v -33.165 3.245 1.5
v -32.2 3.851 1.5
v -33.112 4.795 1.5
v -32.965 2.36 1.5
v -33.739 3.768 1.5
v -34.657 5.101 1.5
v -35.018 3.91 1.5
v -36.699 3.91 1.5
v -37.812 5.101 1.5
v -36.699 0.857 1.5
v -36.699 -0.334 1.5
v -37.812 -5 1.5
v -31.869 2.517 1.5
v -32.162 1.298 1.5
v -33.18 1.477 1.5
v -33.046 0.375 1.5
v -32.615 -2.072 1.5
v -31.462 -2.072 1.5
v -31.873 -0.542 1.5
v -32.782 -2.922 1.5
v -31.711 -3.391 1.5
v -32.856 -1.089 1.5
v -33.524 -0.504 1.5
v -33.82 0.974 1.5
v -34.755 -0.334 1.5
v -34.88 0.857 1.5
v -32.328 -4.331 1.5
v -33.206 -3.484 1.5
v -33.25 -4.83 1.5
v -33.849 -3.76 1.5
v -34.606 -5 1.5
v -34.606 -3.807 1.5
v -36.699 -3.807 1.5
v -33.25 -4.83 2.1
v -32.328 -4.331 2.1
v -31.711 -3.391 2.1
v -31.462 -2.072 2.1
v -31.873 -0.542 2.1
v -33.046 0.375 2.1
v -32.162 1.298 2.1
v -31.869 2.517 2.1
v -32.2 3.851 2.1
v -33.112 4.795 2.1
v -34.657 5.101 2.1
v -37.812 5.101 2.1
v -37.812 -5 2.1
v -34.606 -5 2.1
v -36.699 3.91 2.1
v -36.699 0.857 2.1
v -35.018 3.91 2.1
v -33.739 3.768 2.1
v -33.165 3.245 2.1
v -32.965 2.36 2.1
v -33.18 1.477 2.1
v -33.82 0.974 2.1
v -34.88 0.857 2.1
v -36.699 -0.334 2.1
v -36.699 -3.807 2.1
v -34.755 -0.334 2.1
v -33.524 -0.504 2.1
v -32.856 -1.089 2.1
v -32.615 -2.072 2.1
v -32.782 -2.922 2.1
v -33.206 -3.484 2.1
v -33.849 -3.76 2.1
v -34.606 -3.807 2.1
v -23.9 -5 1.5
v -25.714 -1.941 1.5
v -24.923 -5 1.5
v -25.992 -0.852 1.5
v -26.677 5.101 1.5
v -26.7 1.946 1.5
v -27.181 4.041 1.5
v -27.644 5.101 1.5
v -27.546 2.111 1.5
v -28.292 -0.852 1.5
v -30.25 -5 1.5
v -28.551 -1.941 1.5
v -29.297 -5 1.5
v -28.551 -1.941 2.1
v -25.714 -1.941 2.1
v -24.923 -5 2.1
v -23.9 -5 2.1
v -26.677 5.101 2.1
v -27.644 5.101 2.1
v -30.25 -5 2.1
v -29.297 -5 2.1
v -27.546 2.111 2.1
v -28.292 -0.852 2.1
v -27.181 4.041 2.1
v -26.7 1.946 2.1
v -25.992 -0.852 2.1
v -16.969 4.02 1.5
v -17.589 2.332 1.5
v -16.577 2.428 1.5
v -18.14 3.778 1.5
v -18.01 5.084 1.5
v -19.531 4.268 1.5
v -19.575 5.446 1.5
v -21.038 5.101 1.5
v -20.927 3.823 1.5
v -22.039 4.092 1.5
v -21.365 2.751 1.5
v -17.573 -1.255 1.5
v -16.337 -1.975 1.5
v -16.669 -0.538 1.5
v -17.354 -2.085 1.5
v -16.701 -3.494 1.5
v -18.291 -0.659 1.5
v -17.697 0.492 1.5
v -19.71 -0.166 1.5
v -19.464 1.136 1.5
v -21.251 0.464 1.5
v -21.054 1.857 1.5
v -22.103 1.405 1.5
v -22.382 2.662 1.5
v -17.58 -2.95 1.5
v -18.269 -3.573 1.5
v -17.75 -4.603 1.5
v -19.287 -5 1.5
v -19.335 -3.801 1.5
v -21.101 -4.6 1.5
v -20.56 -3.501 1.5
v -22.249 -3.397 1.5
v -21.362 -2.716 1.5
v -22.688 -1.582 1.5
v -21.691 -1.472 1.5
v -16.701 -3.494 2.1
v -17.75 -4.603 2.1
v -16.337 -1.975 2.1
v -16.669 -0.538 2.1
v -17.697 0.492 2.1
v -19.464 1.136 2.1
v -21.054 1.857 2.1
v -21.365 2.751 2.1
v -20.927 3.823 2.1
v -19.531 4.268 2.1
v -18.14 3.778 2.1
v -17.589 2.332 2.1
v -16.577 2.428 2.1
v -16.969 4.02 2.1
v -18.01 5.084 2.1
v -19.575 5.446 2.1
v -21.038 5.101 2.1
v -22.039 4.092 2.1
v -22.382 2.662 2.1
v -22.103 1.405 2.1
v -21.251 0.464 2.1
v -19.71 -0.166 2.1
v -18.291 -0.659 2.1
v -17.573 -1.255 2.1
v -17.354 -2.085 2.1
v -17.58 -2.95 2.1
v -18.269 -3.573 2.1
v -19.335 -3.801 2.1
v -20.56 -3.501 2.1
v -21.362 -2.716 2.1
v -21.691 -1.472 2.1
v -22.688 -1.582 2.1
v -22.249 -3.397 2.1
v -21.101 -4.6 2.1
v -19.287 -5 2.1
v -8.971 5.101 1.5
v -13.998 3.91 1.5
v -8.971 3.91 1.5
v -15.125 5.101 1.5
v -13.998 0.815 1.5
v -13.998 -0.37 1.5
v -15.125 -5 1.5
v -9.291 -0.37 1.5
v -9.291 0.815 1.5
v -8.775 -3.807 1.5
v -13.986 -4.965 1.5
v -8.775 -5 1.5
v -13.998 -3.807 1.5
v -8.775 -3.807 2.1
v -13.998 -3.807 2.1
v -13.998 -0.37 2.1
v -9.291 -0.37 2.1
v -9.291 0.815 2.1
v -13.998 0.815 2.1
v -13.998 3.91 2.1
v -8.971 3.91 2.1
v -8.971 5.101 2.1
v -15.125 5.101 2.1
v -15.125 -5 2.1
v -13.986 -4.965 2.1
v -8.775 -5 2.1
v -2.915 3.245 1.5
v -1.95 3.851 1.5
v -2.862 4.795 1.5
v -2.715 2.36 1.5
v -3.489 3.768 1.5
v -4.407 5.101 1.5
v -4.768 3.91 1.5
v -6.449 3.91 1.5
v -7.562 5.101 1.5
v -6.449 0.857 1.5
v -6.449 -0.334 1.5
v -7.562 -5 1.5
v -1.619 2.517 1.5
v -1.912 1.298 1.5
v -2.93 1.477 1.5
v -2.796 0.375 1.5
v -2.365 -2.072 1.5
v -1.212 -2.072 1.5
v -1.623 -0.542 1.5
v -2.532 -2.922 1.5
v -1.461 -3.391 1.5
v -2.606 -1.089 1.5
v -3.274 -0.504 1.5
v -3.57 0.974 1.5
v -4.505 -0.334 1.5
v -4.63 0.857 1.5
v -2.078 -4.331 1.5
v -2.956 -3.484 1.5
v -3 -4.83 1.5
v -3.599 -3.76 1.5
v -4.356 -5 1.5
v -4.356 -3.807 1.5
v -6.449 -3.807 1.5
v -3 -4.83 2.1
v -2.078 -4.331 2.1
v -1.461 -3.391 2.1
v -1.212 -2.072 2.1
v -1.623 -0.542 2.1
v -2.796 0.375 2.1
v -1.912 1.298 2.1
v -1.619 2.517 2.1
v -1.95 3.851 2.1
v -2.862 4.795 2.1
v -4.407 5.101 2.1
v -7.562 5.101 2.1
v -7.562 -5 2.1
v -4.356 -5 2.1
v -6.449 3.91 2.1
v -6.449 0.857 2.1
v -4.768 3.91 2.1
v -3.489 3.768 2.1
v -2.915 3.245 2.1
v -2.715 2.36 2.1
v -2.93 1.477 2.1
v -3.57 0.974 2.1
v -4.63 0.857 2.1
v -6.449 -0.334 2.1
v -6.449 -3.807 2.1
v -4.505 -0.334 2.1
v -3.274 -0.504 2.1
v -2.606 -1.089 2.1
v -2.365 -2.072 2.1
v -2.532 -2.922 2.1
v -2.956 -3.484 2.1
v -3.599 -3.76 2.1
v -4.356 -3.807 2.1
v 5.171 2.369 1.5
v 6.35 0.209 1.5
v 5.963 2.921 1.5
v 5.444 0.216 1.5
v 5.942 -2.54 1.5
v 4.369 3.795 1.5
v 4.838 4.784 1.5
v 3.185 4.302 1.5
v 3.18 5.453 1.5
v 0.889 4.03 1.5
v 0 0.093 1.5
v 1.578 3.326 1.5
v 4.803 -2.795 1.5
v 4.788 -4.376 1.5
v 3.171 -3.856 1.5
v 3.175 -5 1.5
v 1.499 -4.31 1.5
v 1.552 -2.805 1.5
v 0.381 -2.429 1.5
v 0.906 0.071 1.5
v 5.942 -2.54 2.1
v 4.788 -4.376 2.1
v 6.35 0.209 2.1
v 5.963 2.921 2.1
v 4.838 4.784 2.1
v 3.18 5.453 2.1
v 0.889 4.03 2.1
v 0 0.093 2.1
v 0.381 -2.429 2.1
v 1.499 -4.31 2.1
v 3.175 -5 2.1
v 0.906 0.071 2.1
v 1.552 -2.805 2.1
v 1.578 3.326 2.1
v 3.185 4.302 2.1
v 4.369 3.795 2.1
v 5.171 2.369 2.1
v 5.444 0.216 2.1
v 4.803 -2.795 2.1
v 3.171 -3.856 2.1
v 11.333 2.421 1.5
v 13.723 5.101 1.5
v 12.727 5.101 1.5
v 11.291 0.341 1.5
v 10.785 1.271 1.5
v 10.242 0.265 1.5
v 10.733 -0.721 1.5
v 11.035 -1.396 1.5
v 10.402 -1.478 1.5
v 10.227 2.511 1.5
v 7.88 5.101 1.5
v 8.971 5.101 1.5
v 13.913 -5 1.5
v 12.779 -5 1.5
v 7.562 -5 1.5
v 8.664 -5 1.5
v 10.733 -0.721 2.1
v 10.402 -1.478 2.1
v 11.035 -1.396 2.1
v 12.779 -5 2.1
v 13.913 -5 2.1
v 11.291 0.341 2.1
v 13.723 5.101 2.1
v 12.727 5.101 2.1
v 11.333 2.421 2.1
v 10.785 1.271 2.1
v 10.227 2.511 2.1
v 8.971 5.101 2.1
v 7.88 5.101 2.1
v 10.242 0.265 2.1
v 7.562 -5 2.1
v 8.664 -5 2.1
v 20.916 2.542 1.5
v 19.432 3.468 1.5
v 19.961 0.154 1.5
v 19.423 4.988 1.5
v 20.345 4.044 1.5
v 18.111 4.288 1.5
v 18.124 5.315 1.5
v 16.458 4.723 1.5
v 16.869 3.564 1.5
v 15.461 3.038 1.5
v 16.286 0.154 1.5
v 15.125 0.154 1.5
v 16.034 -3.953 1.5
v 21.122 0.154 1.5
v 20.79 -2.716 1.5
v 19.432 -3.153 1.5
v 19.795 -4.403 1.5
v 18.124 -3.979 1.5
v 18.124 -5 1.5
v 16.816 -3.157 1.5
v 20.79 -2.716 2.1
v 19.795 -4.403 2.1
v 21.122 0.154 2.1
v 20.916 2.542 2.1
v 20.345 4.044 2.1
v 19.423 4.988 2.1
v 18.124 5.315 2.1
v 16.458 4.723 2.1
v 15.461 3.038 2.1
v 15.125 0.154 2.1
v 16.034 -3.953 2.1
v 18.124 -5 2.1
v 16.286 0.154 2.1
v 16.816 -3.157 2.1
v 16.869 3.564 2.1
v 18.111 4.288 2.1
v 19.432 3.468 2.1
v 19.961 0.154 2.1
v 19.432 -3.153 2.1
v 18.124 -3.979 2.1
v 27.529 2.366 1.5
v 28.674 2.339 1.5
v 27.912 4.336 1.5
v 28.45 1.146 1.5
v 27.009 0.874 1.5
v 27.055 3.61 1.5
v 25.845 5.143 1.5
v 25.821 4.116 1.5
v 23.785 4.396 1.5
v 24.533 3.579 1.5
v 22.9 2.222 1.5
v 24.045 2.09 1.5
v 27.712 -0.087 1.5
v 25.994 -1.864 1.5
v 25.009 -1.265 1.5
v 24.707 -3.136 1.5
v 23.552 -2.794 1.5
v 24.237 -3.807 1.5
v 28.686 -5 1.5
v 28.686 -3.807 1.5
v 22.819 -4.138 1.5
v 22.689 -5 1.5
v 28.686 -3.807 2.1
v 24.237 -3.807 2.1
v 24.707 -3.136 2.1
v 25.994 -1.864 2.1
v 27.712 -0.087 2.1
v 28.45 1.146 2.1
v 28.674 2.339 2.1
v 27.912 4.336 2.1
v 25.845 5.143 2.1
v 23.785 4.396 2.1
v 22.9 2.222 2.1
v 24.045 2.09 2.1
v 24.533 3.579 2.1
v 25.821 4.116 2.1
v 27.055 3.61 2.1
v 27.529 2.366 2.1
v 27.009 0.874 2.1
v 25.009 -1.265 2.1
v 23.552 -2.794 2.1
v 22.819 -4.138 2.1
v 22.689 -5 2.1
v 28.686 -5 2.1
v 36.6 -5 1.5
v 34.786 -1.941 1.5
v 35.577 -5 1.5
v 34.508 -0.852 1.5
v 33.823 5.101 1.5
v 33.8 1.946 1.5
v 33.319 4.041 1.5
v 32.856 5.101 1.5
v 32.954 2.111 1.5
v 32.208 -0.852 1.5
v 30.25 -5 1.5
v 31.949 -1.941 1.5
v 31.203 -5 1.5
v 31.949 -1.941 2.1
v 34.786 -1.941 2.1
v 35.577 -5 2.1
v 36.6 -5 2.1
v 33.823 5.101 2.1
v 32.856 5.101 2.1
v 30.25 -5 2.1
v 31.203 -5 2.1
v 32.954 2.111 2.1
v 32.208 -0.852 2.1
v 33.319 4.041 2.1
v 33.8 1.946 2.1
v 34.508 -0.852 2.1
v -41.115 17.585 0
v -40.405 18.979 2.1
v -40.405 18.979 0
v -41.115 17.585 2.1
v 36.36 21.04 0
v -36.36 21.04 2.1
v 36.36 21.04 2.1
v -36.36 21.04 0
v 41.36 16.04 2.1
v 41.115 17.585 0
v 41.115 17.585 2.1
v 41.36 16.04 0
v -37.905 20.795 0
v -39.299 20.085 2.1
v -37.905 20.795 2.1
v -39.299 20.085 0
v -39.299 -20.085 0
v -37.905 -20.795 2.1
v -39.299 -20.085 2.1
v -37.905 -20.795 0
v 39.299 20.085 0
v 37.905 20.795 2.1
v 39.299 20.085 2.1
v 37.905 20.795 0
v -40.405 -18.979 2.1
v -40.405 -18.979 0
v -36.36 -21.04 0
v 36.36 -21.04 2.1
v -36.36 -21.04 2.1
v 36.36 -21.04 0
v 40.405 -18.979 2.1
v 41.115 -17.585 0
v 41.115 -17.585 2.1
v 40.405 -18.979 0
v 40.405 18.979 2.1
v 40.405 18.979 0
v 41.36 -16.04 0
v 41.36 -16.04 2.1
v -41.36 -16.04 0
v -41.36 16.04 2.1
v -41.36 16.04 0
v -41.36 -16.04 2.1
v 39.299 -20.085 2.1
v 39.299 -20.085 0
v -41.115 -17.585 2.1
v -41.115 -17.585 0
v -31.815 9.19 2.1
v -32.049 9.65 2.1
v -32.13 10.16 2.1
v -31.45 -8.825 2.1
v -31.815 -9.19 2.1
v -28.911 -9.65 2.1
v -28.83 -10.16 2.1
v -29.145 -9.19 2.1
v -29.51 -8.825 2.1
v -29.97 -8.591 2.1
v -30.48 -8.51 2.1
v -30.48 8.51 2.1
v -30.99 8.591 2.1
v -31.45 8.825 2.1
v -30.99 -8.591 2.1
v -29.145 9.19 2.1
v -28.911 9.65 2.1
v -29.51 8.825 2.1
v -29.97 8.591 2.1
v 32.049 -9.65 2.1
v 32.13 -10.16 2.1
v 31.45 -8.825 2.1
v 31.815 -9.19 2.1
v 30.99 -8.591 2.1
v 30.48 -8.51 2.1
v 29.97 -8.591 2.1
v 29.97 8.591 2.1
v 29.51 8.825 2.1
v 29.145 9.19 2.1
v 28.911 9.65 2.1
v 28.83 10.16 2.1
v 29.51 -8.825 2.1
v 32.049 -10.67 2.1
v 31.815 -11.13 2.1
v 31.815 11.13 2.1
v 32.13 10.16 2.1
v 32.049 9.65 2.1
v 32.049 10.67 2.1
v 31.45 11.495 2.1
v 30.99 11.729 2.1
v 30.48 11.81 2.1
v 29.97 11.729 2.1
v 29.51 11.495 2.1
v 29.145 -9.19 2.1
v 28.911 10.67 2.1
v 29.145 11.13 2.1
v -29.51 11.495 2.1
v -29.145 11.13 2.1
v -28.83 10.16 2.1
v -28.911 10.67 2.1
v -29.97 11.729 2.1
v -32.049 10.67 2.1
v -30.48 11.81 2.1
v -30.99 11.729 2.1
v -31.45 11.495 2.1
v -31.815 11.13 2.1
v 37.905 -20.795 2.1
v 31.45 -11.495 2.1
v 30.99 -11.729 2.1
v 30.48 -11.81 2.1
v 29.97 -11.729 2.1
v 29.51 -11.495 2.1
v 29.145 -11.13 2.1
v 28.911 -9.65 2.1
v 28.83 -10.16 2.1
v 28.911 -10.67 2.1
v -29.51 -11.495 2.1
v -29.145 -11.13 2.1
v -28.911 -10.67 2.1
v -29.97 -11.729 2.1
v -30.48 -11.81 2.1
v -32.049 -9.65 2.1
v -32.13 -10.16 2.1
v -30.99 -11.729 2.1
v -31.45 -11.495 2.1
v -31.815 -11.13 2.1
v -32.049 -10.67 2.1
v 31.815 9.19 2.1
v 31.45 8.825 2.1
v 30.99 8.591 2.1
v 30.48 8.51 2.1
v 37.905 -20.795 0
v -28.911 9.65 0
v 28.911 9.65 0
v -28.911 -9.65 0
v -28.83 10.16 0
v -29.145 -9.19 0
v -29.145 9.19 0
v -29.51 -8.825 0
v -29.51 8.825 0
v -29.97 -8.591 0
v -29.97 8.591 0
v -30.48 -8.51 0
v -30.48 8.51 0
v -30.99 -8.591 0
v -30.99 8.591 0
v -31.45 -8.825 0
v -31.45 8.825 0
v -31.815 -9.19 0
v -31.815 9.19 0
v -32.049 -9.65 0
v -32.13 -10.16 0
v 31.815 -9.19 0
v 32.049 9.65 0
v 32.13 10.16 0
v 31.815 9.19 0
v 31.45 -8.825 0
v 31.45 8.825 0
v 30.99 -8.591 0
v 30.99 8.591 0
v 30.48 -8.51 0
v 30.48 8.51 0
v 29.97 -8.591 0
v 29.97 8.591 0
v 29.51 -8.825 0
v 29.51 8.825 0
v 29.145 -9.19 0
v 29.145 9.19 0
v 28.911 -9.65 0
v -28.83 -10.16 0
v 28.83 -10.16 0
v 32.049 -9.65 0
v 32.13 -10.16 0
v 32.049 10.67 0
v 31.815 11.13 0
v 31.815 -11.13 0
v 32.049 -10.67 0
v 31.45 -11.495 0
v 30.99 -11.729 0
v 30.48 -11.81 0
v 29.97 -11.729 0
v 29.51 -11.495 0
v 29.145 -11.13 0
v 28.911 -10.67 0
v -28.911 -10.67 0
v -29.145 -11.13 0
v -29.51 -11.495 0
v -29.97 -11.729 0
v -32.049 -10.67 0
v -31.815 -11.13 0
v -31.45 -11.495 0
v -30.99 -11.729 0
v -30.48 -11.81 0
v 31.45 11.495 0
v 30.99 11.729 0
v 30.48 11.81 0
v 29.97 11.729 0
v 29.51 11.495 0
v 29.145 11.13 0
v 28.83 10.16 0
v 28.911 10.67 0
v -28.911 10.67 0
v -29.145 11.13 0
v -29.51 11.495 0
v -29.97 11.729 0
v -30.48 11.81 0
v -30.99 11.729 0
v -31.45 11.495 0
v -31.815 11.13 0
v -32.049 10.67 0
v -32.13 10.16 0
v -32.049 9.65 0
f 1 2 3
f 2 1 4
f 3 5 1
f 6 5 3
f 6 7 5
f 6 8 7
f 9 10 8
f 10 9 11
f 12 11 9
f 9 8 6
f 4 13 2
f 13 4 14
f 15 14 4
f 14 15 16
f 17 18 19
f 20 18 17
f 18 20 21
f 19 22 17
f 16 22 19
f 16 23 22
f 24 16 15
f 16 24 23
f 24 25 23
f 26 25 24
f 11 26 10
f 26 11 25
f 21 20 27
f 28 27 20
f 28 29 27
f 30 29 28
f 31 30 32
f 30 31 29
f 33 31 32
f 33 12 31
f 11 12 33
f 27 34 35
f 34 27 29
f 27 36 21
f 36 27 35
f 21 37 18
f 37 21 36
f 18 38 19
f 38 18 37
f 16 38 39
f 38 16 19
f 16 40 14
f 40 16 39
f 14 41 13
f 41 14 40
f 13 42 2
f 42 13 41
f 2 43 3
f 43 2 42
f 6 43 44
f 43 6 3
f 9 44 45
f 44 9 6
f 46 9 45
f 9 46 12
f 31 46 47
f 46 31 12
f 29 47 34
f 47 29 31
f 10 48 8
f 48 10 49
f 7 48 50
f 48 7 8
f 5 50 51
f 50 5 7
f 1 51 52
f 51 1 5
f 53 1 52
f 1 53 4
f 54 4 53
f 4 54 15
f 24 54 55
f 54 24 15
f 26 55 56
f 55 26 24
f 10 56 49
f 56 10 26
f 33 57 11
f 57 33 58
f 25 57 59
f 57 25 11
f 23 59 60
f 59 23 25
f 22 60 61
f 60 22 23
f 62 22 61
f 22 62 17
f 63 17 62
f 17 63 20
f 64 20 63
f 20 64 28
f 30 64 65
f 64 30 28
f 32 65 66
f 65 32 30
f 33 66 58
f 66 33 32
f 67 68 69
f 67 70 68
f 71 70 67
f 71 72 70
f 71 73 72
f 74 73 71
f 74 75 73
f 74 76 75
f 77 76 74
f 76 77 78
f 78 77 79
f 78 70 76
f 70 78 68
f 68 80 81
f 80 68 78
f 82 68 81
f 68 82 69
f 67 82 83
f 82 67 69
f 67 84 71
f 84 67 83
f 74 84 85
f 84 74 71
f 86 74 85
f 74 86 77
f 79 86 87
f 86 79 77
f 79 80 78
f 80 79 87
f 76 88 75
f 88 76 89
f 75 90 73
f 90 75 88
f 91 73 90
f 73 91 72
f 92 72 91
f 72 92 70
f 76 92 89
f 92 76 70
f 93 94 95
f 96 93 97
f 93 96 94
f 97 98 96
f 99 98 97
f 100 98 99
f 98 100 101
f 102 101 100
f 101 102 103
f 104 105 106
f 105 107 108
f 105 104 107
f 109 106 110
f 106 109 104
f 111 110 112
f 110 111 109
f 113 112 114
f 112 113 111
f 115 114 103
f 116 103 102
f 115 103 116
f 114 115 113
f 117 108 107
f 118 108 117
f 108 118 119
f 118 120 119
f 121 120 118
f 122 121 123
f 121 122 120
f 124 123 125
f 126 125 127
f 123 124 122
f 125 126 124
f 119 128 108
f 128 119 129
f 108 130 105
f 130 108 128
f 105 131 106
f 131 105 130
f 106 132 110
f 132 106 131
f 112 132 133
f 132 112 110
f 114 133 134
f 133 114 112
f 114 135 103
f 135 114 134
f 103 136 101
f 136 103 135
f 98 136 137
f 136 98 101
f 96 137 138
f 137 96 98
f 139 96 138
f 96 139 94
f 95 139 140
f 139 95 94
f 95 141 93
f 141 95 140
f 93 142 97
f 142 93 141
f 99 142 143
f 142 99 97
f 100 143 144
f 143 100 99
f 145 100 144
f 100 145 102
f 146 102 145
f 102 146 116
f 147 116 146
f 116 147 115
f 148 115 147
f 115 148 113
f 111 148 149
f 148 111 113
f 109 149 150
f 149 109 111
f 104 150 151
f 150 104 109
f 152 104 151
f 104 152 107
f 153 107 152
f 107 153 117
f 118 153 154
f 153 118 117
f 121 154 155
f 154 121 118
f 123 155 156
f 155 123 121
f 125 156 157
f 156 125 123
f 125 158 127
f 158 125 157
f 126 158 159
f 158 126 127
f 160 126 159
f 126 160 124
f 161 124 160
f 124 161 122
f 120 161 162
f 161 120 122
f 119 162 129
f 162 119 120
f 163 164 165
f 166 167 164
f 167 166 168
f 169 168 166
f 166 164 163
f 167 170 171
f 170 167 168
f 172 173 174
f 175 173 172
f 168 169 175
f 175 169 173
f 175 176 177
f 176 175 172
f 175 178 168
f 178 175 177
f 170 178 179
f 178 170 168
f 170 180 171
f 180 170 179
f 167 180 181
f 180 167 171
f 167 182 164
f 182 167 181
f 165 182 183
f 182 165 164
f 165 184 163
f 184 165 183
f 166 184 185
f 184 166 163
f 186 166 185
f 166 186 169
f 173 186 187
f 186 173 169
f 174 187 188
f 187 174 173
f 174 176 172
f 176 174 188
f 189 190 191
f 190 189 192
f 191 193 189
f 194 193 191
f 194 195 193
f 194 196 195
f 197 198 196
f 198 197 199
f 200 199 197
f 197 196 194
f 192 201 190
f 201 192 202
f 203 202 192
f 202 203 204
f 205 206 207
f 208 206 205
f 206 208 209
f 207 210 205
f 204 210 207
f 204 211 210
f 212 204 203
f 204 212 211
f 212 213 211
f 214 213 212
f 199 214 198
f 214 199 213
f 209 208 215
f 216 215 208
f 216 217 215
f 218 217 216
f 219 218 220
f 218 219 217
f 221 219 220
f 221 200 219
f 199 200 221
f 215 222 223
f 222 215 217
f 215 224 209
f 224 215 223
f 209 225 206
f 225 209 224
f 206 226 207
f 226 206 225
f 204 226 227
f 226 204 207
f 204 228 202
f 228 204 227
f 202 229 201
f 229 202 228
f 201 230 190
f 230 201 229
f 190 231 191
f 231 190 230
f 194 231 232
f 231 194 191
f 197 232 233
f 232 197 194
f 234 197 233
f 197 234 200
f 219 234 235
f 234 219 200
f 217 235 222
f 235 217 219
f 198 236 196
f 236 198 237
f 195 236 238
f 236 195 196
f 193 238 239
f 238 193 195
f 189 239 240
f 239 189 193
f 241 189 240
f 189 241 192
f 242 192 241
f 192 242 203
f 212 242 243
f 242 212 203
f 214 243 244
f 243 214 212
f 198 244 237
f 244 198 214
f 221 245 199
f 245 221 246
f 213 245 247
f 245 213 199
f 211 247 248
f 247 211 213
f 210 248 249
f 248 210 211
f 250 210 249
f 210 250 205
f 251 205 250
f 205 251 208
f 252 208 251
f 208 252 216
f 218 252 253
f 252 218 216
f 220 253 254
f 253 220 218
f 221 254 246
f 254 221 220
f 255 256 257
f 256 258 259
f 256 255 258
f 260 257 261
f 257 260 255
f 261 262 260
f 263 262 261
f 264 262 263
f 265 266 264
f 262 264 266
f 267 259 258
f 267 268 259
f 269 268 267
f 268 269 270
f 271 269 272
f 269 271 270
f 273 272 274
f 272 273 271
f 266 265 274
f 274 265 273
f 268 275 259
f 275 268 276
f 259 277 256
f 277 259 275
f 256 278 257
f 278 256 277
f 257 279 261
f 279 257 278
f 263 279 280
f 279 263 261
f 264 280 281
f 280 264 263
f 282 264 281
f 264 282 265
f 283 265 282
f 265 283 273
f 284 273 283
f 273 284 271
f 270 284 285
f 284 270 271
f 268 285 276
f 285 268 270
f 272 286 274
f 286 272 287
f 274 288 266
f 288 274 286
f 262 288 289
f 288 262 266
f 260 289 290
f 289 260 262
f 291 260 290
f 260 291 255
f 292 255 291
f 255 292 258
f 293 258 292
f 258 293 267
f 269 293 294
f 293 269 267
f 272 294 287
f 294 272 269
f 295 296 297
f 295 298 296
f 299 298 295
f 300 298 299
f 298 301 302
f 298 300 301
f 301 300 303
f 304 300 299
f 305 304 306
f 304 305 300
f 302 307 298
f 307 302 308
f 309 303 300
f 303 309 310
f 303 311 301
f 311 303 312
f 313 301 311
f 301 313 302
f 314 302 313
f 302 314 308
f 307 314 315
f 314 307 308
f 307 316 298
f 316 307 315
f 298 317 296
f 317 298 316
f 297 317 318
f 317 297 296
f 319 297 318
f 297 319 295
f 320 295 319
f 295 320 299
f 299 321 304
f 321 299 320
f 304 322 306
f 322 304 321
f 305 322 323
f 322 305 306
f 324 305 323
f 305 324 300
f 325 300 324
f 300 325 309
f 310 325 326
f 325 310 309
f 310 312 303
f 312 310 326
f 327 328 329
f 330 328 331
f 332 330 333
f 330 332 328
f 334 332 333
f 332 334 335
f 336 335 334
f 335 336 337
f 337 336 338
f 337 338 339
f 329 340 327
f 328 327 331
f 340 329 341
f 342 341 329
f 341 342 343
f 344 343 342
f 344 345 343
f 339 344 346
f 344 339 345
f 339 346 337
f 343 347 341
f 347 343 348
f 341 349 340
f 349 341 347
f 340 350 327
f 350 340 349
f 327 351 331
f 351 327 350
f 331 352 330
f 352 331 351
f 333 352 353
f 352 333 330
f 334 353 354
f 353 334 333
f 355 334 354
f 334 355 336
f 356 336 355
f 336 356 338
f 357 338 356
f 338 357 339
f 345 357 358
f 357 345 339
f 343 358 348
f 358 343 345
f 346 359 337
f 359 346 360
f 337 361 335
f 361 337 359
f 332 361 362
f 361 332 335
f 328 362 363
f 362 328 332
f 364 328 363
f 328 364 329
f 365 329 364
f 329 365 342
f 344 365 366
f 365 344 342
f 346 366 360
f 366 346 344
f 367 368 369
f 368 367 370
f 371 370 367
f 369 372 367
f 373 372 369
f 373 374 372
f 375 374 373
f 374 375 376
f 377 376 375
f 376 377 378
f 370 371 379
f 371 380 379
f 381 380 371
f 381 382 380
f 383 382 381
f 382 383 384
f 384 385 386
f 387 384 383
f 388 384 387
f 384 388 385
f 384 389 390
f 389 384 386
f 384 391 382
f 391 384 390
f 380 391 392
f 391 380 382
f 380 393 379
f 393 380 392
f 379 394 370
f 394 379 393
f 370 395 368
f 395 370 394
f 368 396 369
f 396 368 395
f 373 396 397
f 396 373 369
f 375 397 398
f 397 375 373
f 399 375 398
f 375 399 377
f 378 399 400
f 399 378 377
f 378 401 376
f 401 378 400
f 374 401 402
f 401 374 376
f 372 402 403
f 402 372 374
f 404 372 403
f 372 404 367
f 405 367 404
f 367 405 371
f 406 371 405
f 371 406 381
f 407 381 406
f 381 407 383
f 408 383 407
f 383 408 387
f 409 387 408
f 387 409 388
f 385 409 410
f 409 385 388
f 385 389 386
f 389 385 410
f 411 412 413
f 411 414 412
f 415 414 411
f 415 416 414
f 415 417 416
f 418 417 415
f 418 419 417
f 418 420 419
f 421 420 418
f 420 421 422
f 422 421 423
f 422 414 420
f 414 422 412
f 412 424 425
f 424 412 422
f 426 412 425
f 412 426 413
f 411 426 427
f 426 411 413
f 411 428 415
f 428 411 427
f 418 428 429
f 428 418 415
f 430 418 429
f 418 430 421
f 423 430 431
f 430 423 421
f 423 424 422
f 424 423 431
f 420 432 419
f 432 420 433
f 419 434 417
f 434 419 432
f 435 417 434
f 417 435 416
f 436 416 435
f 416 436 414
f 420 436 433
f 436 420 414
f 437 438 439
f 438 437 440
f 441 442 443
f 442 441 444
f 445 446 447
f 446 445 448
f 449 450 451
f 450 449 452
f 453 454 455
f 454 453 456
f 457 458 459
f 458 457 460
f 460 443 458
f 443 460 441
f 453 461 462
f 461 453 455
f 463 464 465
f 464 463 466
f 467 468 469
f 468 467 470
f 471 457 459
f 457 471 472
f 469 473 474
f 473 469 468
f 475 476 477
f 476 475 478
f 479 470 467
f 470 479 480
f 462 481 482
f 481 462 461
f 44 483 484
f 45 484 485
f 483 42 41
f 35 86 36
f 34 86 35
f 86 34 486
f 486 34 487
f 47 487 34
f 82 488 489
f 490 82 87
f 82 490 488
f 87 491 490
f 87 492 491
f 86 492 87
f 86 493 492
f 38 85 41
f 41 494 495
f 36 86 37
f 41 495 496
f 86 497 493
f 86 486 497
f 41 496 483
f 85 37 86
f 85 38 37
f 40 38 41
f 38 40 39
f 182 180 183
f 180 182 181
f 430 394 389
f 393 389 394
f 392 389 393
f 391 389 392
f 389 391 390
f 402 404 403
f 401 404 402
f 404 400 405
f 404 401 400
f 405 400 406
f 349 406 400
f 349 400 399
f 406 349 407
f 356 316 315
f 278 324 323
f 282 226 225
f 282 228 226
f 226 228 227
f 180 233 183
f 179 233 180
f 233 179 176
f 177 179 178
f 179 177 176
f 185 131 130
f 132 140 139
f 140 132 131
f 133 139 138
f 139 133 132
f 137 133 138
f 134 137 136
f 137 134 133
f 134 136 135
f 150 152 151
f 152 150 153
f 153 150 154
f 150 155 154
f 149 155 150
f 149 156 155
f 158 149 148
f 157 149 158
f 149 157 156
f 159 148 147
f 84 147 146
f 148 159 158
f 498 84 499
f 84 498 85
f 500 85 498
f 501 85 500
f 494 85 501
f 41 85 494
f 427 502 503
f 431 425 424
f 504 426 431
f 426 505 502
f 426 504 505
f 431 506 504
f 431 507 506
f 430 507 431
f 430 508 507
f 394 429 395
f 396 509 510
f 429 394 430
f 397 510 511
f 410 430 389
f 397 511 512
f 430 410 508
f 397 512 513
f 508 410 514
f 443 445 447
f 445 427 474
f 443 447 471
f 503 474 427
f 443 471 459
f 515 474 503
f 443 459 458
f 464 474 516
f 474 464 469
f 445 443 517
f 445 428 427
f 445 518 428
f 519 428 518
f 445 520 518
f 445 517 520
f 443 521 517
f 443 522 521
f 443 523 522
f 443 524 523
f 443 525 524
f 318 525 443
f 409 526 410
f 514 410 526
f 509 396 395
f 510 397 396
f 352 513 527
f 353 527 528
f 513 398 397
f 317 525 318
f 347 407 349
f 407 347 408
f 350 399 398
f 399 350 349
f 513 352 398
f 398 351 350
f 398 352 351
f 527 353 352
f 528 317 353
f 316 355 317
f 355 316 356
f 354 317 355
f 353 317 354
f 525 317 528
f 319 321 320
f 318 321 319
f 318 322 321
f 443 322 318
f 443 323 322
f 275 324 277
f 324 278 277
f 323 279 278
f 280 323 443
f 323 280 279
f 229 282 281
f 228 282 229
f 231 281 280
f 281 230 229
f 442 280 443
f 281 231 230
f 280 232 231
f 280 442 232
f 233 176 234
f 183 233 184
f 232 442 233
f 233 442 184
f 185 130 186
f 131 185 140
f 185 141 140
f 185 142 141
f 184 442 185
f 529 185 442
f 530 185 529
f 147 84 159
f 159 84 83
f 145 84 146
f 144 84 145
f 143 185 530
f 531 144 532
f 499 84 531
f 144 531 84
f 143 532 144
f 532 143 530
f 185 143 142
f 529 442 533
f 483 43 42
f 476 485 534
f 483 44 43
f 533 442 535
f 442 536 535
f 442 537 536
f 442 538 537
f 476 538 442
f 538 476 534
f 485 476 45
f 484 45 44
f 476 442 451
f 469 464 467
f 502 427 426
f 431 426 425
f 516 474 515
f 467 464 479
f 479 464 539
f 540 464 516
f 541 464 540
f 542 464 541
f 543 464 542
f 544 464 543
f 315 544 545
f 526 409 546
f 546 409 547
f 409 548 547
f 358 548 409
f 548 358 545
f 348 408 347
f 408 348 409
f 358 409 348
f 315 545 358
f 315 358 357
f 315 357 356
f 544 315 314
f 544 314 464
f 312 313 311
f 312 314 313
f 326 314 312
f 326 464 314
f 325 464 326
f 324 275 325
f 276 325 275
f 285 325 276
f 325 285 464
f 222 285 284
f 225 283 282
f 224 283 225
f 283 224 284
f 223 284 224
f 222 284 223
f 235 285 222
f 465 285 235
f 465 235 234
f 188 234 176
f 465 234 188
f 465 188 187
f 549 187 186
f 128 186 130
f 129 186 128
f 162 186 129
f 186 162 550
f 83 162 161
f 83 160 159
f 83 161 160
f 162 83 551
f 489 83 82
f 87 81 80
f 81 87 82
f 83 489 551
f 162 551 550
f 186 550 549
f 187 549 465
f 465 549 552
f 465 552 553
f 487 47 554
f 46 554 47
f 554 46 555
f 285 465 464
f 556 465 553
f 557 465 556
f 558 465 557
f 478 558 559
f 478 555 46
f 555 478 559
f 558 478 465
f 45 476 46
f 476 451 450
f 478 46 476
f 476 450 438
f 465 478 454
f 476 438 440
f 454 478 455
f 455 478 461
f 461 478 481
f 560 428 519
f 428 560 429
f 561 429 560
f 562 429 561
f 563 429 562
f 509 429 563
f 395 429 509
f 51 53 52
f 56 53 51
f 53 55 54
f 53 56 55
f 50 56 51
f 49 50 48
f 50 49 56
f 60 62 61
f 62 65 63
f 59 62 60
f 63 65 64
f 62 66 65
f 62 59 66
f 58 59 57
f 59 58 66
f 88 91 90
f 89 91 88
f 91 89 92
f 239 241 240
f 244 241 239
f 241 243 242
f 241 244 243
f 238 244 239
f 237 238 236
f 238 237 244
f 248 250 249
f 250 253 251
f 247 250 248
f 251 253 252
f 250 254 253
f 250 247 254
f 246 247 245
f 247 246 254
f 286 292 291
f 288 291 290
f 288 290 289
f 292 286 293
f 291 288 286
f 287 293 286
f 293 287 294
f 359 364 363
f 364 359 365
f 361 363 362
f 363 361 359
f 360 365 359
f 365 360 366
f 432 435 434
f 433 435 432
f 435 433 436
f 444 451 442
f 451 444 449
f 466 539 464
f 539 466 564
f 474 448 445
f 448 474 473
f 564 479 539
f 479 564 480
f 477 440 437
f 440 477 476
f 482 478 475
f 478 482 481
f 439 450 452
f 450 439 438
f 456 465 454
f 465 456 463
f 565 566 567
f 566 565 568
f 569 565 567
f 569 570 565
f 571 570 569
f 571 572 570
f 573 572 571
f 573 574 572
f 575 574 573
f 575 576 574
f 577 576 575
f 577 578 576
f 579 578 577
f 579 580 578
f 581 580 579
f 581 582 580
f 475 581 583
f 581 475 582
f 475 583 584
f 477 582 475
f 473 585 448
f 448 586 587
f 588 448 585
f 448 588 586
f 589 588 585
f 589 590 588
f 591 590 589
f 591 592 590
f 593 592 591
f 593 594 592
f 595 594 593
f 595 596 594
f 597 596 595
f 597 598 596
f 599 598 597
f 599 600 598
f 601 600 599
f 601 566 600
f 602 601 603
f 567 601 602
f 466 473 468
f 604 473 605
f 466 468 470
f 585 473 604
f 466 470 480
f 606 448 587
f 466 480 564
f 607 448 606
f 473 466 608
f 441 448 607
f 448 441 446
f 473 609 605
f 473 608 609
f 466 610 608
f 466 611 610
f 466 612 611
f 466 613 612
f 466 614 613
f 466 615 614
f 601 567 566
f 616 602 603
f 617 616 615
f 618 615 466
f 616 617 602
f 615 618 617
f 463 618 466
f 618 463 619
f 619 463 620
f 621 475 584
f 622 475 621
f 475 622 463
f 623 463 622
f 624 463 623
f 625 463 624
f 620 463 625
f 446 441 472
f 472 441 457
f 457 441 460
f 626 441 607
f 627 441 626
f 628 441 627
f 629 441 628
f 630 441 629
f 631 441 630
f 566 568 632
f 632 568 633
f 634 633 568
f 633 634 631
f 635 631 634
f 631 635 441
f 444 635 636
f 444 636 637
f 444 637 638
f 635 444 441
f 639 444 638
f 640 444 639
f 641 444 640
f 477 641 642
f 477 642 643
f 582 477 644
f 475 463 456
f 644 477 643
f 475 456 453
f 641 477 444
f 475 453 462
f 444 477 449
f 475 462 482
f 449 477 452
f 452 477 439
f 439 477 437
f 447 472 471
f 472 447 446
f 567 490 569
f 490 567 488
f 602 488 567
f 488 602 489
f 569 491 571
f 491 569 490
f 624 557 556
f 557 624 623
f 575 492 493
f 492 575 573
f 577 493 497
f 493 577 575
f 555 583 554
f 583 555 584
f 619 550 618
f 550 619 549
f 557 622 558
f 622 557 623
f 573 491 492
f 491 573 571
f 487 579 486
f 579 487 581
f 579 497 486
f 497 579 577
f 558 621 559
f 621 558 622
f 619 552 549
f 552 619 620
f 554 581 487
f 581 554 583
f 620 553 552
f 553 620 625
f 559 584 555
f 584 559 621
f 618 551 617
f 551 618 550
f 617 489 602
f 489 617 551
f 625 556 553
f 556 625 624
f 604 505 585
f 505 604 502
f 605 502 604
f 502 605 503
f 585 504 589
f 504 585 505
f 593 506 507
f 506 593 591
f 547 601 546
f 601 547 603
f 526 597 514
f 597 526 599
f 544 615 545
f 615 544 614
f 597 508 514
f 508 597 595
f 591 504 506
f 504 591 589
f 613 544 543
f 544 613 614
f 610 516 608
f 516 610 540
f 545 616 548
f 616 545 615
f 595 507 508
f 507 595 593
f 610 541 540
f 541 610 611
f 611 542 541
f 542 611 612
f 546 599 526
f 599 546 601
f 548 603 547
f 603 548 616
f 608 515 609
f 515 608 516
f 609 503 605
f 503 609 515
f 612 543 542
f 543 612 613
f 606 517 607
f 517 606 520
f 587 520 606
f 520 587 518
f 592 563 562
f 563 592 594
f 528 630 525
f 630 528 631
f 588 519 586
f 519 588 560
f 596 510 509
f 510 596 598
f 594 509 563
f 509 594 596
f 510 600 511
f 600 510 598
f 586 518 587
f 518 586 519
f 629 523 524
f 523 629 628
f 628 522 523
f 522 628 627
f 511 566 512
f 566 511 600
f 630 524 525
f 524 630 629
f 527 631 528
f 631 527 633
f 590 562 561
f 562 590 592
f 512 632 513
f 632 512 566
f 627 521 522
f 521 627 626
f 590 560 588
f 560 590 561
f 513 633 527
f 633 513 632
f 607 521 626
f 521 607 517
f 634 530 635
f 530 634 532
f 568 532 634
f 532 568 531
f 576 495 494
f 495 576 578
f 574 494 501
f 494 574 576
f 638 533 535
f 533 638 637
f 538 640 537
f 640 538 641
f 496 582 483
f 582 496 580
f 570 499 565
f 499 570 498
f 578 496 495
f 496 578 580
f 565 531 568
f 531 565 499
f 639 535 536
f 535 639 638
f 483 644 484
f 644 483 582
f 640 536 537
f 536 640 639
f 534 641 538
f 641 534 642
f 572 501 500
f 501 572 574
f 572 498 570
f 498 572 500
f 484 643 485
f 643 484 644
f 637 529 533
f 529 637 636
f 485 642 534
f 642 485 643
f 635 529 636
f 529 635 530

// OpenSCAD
// file: ../configuration.scad
//Název boxu (zařízení)
box_jmeno="BASEBOX02A";

//ALBASE1115
//------------------------------------------------------------
///*
vzdalenost_der = 10.16; //rozteč děr mezi sebou
radidus_hrany = 5; //radius zaobleni sloupku

//parametry lišty
vzdalenost_od_okraje = 8.88; //vzdalenost stredu upevnovaci diry od kraje desky

//mala hrana
pocet_der1 = 0; //pocet der desky, ponížené o 3

//velka hrana
pocet_der2 = 4; //pocet der desky, ponížené o 3
//*/


//OBECNE PARAMETRY KRABICKY
//------------------------------------------------------------
//BOCNICE
vyska_bocnice=30;
tloustka_bocnice=2;

//PLBASE PARAMETRY
//------------------------------------------------------------
tloustka_plbase = 2; //tloustka plbase
prekryti_der=0.3; //sila materiálu, který překrývá díry

//PRIPADNA VYSKA NOZICEK
//------------------------------------------------------------
vyska_nozicky=5;

//Rozmery loga MLAB
//------------------------------------------------------------
logo_vyska=0.15;
logo_sirka=0.15;
// file: ../configuration/manufactury_conf.scad
$fn=20; // model faces resolution.

 //Sroub - podpěra pro tisk sloupku
        vyska_podpery=12;
        vyska_mat_pod_matici=3;

//Sroub - parametry
vyska_hlavy = 3.5;
prumer_hlavy=6;
prumer_sroubu=3.3;

//Matice - parametry
prumer_matice=6; //hrany k hraně
vyska_matice=3;  //vyska matice
posuv_dorazu=0.5;  //pro moznost posuvu dorazu pro vsunutí matice
matice_sila_materialu=2; //sila materialu pod maticí na ose z


//Lišta parametry
//---------------------------------------------------
//rozměry výrezu v ose y
vzdalenost_od_diry = 5; //vzdalenost od stredu upevnovaci diry na druhou stranu
// main file
use <../configuration/plbase.scad>



include <../configuration/manufactury_conf.scad>
include <../configuration.scad>


 translate([-((pocet_der2+2)*vzdalenost_der+2*vzdalenost_od_okraje)/2-tloustka_bocnice,-((pocet_der1+2)*vzdalenost_der+2*vzdalenost_od_okraje)/2-tloustka_bocnice,0])
rotate(a=[0,0,0])
    {
        
        plbase_bez_der_napis(pocet_der2+3,pocet_der1+3,radidus_hrany,vzdalenost_der,vzdalenost_od_okraje,prumer_sroubu,tloustka_plbase,prekryti_der,box_jmeno,tloustka_bocnice);
        
     }
